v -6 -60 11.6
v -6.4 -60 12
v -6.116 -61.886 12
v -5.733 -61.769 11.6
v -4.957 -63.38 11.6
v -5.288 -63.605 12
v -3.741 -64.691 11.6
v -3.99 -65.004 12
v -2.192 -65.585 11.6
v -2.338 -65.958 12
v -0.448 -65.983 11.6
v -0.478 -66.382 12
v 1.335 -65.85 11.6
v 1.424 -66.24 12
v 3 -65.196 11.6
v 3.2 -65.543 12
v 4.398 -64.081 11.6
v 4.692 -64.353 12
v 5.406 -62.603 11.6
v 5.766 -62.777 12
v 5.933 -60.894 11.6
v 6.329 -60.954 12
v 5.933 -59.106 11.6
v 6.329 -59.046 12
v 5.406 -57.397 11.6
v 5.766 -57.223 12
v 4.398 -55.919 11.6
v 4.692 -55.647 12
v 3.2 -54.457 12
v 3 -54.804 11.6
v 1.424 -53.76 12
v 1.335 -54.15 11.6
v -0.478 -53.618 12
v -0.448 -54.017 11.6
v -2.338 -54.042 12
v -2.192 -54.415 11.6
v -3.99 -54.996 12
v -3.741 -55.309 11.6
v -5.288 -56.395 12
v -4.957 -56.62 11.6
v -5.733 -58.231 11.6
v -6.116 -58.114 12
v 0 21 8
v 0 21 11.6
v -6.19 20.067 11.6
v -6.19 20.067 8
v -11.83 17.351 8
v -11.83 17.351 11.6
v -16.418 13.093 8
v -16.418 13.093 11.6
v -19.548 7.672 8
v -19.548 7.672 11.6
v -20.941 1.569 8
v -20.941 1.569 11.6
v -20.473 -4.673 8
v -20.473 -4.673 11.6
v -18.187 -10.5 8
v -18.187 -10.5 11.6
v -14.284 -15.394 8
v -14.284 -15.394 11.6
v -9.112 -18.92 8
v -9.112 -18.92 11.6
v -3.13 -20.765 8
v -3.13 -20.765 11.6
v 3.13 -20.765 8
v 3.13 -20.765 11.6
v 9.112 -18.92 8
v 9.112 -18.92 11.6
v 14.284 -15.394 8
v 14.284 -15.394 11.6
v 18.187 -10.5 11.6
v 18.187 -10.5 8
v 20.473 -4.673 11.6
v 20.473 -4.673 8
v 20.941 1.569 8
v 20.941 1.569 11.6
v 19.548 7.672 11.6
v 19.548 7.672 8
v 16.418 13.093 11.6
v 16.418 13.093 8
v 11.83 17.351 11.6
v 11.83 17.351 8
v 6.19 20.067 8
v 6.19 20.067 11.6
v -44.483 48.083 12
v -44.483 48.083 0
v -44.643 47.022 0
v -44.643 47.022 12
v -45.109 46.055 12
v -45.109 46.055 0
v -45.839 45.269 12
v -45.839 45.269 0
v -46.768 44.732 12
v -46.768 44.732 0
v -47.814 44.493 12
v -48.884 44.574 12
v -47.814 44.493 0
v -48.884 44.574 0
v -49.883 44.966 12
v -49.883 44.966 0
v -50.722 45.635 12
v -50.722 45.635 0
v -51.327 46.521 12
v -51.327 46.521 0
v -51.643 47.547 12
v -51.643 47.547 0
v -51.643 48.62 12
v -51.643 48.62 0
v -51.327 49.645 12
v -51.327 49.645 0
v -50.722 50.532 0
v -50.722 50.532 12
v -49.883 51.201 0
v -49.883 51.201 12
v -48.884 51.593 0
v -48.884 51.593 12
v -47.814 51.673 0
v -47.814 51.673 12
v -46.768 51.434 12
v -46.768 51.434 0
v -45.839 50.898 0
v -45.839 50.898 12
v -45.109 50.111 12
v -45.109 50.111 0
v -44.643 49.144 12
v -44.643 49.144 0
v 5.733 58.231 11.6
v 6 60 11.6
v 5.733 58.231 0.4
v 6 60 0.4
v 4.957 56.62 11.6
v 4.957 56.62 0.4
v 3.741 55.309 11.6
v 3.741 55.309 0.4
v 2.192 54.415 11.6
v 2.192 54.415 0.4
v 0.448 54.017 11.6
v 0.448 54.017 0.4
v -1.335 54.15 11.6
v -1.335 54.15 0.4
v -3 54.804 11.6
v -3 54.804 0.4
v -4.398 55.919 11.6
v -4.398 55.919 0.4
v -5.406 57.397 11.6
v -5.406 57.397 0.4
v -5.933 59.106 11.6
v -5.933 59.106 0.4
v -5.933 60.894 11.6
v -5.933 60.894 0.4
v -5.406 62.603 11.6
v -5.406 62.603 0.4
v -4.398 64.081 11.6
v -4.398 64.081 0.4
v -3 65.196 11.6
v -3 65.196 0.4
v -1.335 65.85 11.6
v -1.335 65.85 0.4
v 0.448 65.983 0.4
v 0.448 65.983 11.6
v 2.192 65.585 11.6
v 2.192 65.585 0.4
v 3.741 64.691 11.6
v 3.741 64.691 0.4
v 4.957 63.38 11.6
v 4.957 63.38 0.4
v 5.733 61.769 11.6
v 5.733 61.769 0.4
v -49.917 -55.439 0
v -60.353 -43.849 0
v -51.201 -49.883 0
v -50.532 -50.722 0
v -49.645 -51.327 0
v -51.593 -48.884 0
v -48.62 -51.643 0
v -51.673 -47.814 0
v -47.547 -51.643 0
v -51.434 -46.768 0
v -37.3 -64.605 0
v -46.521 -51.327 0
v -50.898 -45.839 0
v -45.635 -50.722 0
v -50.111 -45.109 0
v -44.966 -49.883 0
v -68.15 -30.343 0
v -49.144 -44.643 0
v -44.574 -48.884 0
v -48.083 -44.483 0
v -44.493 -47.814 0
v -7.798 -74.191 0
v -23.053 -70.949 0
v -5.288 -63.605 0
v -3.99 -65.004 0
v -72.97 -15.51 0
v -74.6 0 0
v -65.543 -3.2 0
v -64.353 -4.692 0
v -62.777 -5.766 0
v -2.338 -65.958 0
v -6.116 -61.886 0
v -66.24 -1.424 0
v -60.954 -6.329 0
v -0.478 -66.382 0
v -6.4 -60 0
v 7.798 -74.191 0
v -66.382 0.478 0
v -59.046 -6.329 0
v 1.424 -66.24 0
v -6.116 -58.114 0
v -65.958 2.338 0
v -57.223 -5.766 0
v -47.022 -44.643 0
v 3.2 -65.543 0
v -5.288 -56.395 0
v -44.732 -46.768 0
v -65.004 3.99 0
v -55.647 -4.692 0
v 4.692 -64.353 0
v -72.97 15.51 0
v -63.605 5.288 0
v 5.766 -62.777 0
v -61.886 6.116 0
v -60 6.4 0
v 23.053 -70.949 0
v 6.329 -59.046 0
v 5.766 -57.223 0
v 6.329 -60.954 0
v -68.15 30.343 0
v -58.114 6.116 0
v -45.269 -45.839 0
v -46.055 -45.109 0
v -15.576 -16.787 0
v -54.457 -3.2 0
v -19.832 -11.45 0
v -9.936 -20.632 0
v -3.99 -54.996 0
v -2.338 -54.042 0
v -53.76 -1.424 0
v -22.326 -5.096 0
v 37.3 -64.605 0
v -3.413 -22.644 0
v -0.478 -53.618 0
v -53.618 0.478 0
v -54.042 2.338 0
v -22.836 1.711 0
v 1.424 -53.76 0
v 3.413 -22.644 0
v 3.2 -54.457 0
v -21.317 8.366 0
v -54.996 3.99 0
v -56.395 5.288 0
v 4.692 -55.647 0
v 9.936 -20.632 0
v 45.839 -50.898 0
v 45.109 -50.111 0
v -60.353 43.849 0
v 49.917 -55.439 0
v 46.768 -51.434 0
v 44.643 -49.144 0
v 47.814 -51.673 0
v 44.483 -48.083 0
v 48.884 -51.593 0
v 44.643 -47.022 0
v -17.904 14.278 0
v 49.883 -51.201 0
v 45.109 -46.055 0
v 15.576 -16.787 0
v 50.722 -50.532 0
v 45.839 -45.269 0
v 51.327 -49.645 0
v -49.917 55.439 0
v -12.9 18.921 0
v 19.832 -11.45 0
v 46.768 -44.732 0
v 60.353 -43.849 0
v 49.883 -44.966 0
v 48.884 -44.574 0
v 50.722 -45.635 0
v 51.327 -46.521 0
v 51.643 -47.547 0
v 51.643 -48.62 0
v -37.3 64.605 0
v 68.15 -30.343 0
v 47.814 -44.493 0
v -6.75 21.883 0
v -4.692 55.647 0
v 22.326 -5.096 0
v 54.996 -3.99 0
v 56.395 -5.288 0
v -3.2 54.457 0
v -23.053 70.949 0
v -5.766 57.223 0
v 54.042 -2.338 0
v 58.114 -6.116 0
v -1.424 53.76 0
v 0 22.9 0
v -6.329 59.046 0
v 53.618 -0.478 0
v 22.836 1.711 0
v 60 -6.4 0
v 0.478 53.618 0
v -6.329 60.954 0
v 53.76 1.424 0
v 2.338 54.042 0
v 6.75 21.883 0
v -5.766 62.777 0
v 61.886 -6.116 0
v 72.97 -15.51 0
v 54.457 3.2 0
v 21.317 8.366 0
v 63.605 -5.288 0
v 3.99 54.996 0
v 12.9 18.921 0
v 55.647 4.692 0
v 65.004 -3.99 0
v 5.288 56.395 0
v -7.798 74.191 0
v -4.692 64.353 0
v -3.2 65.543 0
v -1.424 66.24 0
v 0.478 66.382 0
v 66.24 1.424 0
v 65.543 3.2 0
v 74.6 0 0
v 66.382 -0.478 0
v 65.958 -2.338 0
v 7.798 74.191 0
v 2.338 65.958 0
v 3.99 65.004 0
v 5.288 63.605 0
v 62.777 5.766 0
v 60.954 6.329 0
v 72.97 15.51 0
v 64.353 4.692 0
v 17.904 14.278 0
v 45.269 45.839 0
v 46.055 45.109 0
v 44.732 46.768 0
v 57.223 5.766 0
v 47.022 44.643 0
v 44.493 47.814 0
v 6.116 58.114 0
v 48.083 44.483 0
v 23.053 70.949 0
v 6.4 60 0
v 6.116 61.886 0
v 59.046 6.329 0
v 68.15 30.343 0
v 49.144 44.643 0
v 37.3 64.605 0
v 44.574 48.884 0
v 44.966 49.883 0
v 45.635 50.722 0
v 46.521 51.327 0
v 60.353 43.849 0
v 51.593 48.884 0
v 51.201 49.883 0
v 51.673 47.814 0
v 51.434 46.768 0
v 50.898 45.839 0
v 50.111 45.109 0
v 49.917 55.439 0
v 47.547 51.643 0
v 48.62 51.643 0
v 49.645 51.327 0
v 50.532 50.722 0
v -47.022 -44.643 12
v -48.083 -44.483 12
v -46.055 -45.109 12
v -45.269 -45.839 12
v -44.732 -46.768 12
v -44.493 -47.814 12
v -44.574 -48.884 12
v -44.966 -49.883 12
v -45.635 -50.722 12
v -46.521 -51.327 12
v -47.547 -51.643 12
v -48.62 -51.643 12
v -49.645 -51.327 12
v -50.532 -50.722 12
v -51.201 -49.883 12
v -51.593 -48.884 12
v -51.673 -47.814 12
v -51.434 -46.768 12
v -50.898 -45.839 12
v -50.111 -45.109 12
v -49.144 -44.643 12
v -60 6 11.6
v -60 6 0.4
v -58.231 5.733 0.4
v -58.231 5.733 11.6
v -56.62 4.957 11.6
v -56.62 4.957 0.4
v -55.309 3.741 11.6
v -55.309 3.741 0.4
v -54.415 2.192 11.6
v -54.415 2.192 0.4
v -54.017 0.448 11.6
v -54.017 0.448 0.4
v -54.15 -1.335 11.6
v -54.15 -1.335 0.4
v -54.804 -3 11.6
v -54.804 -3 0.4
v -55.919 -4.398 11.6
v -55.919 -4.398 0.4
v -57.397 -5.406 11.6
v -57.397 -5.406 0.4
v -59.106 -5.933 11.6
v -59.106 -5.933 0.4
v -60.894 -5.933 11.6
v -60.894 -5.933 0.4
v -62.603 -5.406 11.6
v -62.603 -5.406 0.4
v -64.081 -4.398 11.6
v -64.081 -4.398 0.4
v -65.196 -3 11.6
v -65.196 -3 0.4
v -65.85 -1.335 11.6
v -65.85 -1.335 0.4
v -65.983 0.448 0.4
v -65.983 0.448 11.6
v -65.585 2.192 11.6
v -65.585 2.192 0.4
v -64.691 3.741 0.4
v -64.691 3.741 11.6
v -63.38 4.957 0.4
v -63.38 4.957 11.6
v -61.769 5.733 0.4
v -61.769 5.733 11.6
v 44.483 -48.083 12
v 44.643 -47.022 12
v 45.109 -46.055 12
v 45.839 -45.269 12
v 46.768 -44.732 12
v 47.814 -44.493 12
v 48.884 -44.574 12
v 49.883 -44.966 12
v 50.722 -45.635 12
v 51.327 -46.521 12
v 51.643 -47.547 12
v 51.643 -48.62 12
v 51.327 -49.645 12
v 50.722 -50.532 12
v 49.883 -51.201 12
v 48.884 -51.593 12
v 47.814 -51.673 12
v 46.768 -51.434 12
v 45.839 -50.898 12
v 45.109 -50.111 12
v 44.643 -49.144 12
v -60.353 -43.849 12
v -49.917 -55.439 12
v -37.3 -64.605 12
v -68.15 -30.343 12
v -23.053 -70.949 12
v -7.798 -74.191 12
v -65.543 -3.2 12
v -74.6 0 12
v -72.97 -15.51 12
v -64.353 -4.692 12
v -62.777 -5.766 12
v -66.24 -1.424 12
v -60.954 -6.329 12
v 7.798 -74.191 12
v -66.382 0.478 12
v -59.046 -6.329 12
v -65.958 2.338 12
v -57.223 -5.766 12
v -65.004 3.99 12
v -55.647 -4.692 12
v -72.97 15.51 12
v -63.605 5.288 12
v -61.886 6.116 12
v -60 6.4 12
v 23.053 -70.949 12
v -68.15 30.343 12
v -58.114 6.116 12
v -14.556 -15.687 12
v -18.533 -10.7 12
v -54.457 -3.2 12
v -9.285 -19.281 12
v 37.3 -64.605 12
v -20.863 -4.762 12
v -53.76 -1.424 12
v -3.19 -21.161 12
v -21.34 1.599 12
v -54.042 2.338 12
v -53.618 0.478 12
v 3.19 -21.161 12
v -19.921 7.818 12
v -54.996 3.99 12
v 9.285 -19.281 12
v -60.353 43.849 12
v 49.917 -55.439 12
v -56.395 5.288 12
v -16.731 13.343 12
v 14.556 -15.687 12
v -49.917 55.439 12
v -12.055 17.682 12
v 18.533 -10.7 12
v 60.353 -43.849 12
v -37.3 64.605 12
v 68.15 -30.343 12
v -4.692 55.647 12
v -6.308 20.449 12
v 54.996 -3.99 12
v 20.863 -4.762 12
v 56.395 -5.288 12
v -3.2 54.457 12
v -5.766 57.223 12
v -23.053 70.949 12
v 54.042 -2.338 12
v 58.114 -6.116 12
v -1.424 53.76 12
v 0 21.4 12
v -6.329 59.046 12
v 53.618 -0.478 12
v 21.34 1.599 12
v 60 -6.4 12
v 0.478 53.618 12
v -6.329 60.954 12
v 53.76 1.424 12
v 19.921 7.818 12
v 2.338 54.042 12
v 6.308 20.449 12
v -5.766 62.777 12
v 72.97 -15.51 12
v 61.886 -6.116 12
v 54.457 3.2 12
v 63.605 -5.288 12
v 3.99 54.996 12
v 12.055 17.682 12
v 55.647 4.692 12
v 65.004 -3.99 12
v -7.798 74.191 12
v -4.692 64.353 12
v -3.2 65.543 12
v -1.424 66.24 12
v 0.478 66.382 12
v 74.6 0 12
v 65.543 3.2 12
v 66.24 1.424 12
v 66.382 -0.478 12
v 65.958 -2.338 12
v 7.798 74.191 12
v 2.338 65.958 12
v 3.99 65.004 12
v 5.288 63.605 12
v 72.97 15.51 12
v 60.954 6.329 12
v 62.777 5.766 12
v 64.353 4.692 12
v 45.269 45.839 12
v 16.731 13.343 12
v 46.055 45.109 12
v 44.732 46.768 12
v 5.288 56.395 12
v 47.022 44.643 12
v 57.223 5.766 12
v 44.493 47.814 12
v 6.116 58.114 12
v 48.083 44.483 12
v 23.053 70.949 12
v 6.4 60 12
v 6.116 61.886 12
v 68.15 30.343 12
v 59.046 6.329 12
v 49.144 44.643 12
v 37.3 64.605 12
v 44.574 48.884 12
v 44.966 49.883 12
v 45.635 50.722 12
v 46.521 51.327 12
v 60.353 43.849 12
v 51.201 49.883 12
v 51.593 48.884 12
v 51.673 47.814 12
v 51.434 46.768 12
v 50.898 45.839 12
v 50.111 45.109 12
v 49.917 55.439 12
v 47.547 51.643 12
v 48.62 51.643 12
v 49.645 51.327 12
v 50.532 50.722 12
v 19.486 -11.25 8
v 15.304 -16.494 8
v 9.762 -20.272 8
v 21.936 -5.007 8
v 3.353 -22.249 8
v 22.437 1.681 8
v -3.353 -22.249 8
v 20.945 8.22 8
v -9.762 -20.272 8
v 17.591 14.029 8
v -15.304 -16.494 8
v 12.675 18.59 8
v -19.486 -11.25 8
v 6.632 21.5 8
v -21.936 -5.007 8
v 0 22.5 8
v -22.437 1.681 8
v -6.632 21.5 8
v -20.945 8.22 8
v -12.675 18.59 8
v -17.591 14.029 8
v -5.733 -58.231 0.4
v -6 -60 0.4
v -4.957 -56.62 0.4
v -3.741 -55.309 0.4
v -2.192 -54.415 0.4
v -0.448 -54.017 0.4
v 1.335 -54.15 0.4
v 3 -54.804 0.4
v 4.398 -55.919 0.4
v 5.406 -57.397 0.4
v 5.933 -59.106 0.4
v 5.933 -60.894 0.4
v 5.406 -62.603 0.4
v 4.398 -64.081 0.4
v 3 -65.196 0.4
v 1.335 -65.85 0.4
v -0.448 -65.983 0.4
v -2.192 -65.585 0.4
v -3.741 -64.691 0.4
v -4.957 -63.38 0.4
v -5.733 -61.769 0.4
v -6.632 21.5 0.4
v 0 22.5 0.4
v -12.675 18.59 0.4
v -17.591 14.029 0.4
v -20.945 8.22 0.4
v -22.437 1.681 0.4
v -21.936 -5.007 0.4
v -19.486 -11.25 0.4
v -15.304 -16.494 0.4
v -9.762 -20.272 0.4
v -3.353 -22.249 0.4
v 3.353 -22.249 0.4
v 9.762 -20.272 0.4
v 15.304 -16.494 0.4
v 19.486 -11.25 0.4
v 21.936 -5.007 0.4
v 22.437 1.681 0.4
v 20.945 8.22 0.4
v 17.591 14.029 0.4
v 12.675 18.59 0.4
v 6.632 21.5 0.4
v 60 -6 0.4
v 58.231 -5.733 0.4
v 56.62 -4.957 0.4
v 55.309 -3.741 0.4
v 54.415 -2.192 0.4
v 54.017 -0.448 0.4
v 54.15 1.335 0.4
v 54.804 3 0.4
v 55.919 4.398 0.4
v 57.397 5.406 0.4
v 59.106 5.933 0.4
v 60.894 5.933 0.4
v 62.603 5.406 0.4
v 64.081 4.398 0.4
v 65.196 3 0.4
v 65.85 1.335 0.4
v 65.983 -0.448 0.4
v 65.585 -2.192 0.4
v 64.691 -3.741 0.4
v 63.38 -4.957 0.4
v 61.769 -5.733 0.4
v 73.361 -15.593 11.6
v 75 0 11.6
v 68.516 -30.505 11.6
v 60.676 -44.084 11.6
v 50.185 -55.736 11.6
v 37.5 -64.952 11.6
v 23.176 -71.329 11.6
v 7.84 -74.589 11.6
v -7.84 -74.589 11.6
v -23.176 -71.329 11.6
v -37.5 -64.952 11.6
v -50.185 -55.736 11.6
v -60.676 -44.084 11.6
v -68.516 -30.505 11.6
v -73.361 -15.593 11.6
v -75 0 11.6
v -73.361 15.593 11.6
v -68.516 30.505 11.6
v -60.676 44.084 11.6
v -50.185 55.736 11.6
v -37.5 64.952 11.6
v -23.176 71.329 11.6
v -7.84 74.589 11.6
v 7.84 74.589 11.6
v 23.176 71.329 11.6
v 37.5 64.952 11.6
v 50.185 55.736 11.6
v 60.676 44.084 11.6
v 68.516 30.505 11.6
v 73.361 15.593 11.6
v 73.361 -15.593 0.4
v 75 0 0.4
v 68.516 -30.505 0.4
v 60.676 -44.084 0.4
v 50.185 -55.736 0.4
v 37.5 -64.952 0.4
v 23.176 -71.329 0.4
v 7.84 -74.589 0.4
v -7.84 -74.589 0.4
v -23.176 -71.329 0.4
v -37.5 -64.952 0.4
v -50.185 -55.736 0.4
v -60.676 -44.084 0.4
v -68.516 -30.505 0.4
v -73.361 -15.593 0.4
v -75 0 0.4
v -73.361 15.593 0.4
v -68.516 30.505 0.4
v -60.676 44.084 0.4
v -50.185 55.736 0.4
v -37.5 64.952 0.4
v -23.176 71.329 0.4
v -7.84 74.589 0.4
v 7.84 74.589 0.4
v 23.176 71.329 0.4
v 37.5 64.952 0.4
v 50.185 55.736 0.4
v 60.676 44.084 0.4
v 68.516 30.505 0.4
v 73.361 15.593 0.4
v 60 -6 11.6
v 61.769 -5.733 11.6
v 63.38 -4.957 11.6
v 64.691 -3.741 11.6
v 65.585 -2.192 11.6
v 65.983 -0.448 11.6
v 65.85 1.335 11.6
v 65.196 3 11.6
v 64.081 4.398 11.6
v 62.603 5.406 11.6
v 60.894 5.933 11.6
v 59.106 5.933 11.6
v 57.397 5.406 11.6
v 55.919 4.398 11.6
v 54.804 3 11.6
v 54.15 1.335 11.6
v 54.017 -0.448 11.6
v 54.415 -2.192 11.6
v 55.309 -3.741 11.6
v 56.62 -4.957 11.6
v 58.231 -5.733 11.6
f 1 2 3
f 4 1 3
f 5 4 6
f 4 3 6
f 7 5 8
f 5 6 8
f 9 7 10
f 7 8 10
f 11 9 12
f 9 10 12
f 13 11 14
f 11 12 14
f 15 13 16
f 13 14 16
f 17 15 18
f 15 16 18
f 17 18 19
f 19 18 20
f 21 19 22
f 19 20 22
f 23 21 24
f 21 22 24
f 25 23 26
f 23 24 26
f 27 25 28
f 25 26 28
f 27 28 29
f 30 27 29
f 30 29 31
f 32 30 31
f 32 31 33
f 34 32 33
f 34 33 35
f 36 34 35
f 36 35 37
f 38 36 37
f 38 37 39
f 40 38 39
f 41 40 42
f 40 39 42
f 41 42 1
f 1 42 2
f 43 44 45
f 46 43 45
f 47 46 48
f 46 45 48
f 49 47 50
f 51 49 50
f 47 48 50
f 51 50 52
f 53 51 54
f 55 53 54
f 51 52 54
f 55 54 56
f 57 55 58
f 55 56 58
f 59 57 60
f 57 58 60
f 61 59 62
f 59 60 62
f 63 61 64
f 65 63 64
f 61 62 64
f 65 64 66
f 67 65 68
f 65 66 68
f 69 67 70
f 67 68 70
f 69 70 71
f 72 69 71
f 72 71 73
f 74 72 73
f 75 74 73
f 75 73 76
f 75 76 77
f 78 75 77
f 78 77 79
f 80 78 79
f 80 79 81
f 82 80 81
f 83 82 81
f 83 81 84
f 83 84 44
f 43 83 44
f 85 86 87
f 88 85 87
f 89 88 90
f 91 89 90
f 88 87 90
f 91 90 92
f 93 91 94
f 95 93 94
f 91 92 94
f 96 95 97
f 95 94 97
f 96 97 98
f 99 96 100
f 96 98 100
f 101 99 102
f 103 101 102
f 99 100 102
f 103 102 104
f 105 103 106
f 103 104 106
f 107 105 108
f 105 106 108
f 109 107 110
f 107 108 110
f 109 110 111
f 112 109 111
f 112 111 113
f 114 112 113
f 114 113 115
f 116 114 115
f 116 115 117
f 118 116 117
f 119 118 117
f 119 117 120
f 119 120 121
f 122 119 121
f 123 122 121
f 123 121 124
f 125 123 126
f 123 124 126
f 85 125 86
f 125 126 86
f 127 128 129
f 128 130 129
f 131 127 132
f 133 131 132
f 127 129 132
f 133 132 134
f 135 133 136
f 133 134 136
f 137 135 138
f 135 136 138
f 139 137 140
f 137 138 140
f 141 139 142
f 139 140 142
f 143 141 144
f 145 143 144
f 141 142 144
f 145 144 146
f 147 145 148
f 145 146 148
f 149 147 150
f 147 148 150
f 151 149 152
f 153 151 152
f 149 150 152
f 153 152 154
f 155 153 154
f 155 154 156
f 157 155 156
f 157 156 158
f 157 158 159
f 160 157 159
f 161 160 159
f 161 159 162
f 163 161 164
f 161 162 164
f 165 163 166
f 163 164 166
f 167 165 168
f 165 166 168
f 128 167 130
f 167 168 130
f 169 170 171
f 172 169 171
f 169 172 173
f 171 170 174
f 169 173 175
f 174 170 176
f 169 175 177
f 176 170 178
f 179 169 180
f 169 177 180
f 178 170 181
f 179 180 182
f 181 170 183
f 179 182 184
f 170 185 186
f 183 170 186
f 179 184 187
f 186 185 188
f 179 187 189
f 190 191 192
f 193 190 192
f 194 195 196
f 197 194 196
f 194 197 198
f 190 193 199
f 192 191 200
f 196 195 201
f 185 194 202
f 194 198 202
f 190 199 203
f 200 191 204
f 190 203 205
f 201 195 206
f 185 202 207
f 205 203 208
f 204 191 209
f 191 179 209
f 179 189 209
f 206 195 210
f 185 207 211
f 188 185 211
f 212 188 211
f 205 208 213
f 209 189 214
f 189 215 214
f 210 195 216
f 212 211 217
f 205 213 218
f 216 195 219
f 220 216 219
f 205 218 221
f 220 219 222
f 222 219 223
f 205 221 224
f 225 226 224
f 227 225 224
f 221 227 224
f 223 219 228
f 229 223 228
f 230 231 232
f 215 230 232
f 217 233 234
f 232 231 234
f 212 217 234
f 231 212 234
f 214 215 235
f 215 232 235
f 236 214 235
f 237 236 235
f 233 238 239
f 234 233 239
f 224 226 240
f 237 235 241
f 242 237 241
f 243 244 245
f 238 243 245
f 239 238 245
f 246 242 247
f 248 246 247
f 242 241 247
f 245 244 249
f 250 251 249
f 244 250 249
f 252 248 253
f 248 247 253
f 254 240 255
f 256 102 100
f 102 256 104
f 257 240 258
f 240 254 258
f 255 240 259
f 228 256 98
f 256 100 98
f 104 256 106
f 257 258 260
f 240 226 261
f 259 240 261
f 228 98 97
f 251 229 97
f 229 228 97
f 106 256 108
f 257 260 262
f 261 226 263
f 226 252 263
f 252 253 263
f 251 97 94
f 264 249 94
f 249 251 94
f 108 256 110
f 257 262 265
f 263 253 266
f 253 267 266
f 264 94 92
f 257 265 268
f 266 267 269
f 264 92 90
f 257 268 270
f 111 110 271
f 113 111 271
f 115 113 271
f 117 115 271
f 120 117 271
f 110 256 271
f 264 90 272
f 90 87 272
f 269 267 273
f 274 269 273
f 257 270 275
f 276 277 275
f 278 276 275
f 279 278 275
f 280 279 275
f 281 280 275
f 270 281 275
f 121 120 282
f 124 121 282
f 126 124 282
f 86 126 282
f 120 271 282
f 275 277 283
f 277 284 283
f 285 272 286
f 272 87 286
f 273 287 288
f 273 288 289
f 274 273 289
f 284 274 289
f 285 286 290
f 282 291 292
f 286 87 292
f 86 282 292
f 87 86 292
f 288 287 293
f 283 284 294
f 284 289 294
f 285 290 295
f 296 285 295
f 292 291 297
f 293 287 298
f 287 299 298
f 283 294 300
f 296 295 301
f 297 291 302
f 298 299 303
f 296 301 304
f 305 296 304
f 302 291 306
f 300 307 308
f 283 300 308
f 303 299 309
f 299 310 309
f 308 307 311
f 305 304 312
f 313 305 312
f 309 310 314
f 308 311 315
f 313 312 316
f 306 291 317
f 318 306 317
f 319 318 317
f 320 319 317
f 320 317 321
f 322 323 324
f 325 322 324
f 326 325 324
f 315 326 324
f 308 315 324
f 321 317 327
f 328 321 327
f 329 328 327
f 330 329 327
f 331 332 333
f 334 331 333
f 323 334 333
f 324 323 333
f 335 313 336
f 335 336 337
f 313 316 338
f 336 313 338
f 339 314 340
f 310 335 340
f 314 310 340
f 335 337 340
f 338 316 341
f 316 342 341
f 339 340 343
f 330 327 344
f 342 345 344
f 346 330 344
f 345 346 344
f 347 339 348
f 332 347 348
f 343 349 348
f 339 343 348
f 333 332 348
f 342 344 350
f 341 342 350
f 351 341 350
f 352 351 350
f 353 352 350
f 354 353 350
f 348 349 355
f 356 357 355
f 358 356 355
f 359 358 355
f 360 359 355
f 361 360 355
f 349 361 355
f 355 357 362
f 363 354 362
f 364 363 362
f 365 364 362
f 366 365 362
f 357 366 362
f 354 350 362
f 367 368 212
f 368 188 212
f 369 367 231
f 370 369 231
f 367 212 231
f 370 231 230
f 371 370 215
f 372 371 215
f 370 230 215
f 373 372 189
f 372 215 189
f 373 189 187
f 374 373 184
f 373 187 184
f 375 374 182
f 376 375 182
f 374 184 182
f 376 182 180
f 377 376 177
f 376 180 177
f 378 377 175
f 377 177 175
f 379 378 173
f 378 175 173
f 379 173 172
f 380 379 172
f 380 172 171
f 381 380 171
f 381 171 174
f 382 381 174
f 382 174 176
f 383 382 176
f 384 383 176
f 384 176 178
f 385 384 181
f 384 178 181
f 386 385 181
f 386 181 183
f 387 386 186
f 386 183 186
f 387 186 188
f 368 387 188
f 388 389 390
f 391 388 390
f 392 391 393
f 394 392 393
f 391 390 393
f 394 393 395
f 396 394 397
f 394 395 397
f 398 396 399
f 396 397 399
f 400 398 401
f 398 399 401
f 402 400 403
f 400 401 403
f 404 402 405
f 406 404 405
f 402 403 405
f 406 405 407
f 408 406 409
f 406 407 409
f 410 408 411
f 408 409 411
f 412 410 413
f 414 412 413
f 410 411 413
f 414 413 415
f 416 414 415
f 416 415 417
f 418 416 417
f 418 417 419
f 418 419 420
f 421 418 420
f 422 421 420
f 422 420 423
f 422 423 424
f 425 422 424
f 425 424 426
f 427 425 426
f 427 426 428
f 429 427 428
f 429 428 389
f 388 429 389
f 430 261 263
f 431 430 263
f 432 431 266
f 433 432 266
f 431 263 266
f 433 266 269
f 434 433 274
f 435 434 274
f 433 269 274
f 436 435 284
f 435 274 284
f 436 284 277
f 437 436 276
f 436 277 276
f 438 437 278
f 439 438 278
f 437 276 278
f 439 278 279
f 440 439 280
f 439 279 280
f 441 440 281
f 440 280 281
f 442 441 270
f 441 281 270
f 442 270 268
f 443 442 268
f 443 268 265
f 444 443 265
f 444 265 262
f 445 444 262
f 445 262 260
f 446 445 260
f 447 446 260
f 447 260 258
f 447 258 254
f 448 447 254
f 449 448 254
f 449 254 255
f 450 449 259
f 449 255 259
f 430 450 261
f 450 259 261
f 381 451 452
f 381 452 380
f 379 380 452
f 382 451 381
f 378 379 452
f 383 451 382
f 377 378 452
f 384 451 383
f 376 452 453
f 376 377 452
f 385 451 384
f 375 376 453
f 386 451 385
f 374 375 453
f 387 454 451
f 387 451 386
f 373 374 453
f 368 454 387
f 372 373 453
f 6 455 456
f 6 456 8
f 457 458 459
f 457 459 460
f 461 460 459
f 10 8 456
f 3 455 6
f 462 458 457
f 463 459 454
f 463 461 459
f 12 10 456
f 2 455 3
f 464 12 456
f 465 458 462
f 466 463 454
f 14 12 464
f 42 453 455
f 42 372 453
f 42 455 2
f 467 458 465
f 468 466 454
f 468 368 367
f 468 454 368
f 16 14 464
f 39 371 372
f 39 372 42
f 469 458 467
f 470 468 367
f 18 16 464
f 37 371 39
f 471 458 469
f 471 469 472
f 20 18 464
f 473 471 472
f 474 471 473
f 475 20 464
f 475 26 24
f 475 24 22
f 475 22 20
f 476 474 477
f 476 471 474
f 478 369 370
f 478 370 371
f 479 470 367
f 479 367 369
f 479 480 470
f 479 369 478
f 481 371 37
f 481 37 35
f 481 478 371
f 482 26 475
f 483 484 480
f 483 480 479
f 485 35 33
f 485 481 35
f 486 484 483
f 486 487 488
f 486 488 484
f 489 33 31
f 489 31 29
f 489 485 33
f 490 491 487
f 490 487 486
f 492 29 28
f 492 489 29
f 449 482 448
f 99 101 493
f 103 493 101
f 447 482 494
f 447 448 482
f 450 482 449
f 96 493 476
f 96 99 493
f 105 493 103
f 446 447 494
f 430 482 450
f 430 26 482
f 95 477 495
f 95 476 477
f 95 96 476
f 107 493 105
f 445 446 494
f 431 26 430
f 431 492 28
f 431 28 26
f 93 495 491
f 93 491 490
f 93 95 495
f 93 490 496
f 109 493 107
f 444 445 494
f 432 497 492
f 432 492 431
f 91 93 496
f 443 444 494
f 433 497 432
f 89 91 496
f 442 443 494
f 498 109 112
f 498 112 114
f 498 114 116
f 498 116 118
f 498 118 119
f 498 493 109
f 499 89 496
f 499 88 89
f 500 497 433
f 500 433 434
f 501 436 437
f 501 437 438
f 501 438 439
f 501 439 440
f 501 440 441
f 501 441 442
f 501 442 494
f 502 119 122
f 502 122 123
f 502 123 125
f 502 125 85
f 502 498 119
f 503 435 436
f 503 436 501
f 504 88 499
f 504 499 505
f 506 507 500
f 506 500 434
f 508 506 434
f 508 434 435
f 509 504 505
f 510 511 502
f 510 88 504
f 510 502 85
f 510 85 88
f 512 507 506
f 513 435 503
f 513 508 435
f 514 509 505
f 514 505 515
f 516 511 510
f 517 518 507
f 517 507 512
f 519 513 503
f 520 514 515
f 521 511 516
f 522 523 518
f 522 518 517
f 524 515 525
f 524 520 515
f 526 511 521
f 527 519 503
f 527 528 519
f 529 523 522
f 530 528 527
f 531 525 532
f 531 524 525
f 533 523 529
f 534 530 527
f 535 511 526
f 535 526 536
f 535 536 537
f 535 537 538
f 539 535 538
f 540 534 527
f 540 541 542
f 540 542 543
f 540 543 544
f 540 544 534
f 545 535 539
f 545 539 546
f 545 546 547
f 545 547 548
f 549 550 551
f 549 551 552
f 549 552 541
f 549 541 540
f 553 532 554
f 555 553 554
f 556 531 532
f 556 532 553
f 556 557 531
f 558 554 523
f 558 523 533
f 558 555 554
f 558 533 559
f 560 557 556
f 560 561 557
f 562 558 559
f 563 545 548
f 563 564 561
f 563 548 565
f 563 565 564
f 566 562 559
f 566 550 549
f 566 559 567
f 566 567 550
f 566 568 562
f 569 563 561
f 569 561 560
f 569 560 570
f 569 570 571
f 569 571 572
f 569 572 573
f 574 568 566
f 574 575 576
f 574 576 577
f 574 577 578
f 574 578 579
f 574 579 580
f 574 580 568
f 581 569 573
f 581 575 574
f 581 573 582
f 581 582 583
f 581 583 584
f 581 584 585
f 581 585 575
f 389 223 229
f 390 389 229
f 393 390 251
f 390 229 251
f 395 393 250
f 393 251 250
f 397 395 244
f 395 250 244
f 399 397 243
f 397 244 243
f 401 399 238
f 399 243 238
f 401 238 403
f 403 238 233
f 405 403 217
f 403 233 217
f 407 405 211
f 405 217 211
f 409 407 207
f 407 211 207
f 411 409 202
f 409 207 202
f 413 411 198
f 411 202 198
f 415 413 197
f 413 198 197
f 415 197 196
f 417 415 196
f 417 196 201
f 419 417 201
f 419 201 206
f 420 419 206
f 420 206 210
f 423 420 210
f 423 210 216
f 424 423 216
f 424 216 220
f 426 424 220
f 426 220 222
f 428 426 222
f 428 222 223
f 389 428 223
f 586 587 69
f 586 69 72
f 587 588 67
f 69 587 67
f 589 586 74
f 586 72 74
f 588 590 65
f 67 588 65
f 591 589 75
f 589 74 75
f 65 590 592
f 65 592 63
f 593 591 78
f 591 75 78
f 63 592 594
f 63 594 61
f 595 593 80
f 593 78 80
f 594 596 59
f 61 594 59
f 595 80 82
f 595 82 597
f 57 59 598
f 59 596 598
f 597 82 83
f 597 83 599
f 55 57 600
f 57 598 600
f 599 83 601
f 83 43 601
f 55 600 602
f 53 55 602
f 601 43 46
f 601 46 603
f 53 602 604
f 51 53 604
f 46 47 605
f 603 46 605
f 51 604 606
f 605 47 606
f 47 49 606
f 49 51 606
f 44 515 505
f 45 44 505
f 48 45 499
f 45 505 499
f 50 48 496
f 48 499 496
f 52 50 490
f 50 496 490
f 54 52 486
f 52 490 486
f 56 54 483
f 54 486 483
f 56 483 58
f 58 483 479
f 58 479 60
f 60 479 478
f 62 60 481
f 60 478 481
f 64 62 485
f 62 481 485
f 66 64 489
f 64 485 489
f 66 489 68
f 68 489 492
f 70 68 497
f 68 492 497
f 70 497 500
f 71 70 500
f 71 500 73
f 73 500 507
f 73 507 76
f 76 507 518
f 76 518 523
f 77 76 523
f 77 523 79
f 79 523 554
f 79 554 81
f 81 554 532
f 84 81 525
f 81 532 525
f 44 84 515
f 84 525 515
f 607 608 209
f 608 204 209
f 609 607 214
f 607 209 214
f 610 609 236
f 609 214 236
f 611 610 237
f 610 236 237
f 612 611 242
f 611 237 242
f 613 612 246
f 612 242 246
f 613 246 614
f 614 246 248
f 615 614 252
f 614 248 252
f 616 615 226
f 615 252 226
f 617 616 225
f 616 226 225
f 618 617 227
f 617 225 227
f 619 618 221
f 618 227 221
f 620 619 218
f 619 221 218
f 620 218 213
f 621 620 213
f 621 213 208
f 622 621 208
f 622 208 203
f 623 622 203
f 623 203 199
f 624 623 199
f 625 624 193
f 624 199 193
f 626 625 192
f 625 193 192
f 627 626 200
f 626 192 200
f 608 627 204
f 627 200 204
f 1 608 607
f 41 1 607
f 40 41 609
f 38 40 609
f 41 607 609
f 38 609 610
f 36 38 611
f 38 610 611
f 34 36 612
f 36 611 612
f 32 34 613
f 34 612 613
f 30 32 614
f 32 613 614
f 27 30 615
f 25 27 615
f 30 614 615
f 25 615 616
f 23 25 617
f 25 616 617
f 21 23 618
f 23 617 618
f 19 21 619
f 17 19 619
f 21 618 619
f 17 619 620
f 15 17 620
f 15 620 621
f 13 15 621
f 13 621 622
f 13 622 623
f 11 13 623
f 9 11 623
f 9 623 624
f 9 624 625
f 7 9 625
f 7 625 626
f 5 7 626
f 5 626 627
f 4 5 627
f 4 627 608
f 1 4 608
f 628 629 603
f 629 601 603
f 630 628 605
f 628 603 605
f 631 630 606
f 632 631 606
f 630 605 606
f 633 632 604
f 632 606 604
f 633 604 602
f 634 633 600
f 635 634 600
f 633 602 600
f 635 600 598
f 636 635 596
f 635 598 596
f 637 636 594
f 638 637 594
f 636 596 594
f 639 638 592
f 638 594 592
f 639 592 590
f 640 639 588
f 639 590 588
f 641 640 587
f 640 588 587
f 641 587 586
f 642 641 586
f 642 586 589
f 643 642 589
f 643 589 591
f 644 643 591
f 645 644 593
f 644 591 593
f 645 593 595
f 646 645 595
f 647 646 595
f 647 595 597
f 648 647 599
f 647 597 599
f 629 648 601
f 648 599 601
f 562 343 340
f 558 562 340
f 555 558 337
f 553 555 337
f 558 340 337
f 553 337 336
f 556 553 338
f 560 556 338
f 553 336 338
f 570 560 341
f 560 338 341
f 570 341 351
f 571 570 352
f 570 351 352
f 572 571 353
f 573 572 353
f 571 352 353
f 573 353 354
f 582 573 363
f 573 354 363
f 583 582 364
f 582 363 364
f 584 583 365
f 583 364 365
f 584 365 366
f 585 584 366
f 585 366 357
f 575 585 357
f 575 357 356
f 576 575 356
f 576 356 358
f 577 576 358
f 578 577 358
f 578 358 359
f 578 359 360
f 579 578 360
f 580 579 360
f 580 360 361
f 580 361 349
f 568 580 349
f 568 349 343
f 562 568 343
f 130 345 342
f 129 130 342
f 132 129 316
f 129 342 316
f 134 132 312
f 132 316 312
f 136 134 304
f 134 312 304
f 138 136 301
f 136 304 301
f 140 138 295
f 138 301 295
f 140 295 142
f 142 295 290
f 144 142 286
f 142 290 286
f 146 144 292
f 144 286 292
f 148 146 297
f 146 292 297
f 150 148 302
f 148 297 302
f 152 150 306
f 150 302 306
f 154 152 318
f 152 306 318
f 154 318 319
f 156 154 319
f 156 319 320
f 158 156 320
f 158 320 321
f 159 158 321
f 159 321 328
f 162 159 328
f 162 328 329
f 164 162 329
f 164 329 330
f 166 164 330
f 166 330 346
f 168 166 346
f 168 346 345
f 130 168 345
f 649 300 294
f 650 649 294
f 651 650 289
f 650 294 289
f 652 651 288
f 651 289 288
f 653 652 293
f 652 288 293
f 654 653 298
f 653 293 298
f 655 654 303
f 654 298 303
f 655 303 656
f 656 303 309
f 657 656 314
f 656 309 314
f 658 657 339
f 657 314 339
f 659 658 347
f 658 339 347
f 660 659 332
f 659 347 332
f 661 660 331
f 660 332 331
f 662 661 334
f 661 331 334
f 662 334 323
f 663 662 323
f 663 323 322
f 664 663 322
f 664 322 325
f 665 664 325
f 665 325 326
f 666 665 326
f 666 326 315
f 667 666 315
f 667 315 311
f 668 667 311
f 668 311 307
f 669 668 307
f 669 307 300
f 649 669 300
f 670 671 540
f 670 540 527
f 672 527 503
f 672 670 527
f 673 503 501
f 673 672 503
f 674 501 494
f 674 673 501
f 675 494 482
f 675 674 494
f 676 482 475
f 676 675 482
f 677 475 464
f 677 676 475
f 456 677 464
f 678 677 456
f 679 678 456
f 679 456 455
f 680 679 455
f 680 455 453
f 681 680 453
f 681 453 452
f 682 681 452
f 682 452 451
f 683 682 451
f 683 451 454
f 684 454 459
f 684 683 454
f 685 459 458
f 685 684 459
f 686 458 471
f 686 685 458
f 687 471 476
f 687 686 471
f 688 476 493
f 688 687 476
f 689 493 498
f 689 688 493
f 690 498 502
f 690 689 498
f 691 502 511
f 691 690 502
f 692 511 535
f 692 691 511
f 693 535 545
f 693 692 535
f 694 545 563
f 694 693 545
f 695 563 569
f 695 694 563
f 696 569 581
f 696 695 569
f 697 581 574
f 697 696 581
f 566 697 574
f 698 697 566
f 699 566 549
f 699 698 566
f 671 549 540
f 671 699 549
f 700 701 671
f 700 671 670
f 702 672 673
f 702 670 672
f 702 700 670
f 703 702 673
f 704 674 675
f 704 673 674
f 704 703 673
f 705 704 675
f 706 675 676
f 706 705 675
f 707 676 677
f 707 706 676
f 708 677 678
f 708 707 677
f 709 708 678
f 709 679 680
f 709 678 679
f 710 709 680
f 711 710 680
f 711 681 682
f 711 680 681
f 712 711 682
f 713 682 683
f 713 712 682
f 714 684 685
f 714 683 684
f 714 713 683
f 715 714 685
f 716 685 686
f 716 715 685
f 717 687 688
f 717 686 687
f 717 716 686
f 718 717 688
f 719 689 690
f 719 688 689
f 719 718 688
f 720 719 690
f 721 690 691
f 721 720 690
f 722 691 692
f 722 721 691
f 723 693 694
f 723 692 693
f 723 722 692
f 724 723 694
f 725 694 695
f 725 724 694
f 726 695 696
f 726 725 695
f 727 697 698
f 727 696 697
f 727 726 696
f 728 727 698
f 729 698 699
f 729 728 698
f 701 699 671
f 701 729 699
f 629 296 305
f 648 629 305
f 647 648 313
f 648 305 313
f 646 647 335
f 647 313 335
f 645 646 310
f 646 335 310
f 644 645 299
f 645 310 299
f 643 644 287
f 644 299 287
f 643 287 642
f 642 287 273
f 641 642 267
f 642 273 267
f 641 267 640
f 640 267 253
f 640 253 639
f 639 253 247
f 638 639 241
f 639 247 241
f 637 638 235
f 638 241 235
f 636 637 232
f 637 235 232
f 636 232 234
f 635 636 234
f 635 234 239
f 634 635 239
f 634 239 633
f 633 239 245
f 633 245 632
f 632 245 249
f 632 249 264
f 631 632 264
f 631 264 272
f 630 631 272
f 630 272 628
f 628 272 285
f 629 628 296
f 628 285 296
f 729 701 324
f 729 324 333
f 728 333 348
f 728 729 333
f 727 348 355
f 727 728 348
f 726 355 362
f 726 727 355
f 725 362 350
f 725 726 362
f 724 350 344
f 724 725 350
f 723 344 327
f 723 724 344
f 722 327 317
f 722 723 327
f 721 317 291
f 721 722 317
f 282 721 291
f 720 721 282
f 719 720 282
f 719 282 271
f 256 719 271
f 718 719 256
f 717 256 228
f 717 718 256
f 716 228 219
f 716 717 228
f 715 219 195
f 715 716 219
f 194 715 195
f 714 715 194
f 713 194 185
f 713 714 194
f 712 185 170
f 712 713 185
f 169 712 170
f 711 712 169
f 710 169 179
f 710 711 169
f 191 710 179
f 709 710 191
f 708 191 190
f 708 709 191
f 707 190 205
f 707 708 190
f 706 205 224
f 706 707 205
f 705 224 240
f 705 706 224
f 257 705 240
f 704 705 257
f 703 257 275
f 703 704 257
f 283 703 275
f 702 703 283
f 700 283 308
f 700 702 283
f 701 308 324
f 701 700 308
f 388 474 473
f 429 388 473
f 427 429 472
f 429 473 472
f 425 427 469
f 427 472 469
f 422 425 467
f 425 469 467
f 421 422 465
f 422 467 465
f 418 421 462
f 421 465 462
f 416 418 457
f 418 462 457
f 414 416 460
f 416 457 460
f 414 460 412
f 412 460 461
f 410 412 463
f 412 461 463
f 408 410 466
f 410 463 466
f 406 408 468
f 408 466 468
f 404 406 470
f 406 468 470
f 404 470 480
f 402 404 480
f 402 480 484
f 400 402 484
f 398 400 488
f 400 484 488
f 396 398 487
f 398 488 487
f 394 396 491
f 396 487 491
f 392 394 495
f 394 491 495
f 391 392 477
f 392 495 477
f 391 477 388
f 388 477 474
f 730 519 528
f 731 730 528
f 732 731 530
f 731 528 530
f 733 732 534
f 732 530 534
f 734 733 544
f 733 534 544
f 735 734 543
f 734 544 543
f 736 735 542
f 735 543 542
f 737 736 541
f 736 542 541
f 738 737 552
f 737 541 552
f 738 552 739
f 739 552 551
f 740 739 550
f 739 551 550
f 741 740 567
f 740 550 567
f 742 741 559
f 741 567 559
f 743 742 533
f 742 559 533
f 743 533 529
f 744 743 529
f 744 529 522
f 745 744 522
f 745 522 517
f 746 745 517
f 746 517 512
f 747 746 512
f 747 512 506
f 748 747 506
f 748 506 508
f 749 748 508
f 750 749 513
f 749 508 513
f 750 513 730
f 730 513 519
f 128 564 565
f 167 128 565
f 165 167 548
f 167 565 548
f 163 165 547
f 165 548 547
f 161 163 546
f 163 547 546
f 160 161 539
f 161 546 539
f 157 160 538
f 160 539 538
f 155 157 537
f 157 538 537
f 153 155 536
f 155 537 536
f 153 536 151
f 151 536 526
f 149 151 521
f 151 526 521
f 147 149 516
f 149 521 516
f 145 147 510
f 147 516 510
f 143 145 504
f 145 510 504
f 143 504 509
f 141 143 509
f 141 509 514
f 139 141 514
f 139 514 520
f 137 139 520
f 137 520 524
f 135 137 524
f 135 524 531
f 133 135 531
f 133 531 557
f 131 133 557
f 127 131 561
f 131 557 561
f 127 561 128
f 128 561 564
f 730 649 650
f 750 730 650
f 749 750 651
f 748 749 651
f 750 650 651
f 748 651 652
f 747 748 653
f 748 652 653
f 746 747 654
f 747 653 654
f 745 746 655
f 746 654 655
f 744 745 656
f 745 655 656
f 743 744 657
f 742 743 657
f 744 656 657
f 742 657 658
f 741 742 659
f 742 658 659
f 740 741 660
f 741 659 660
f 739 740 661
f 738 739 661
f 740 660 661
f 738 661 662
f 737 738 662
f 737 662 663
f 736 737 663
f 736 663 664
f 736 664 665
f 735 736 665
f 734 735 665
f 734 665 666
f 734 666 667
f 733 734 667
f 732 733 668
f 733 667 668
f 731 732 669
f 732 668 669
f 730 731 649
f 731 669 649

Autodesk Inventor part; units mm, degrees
ref_plane "YZ Plane" through (0, 0, 0) normal (1, 0, 0) x (0, 1, 0)
ref_plane "XZ Plane" through (0, 0, 0) normal (0, 1, 0) x (-1, 0, 0)
ref_plane "XY Plane" through (0, 0, 0) normal (0, 0, 1) x (1, 0, 0)
sketch "Sketch1" plane through (0, 0, 0) normal (0, 0, 1) x (1, 0, 0)
  circle A0 centre (0, 0) radius 75
  dimension "d0" = 150
extrude "Extrusion1" add sketch "Sketch1" along normal blind 12
sketch "Sketch2" plane through (0, 0, 12) normal (0, 0, 1) x (1, 0, 0)
  circle A0 centre (0, 0) radius 60 construction
  point P0 (60, 0)
  dimension "d3" = 120
hole "Hole1" at (60, 0, 12) direction (0, 0, -1) diameter 12 end through all
pattern_circular "Circular Pattern1" count 4 over 360 about axis through (0, 0, 0) along (0, 0, 1) of "Hole1"
sketch "Sketch3" plane through (0, 0, 12) normal (0, 0, 1) x (1, 0, 0)
  circle A0 centre (0, 0) radius 68 construction
  line L0 (48.0833, 48.0833) -> (0, 0) construction
  line L1 (0, 0) -> (75, 0) construction
  circle A1 centre (0, 0) radius 75 projected
  dimension "d14" = 136
  dimension "d15" = 45
hole "Hole2" at (48.0833, 48.0833, 12) direction (0, 0, -1) diameter 7.2 end through all
pattern_circular "Circular Pattern2" count 4 over 360 about axis through (0, 0, 0) along (0, 0, 1) of "Hole2"
sketch "Sketch4" plane through (0, 0, 0) normal (1, 0, 0) x (0, 1, 0)
  line L0 (0, 0) -> (0, 12)
  line L1 (75, 12) -> (-75, 12) projected
  line L2 (75, 0) -> (-75, 0) projected
  line L3 (22.5, 0) -> (22.5, 8)
  line L4 (22.5, 8) -> (21, 8)
  line L5 (21, 8) -> (21, 12)
  dimension "d26" = 45
  dimension "d27" = 4
  dimension "d28" = 42
revolve "Revolution1" cut sketch "Sketch4" angle 360 about axis through (0, 0, 0) along (0, 0, 1)
chamfer "Chamfer1" distance 0.4 angle 45 4 edges at (-75, 0, 0) (-75, 0, 12) (0, -21, 12) (0, -22.5, 0)
chamfer "Chamfer2" distance 0.4 angle 45 8 edges at (-6, 60, 12) (-60, -6, 12) (6, -60, 12) (60, 6, 12) (-6, 60, 0) (-60, -6, 0) (60, 6, 0) (6, -60, 0)
properties part number "VF65-KF40-adapter" material "Stainless Steel"
